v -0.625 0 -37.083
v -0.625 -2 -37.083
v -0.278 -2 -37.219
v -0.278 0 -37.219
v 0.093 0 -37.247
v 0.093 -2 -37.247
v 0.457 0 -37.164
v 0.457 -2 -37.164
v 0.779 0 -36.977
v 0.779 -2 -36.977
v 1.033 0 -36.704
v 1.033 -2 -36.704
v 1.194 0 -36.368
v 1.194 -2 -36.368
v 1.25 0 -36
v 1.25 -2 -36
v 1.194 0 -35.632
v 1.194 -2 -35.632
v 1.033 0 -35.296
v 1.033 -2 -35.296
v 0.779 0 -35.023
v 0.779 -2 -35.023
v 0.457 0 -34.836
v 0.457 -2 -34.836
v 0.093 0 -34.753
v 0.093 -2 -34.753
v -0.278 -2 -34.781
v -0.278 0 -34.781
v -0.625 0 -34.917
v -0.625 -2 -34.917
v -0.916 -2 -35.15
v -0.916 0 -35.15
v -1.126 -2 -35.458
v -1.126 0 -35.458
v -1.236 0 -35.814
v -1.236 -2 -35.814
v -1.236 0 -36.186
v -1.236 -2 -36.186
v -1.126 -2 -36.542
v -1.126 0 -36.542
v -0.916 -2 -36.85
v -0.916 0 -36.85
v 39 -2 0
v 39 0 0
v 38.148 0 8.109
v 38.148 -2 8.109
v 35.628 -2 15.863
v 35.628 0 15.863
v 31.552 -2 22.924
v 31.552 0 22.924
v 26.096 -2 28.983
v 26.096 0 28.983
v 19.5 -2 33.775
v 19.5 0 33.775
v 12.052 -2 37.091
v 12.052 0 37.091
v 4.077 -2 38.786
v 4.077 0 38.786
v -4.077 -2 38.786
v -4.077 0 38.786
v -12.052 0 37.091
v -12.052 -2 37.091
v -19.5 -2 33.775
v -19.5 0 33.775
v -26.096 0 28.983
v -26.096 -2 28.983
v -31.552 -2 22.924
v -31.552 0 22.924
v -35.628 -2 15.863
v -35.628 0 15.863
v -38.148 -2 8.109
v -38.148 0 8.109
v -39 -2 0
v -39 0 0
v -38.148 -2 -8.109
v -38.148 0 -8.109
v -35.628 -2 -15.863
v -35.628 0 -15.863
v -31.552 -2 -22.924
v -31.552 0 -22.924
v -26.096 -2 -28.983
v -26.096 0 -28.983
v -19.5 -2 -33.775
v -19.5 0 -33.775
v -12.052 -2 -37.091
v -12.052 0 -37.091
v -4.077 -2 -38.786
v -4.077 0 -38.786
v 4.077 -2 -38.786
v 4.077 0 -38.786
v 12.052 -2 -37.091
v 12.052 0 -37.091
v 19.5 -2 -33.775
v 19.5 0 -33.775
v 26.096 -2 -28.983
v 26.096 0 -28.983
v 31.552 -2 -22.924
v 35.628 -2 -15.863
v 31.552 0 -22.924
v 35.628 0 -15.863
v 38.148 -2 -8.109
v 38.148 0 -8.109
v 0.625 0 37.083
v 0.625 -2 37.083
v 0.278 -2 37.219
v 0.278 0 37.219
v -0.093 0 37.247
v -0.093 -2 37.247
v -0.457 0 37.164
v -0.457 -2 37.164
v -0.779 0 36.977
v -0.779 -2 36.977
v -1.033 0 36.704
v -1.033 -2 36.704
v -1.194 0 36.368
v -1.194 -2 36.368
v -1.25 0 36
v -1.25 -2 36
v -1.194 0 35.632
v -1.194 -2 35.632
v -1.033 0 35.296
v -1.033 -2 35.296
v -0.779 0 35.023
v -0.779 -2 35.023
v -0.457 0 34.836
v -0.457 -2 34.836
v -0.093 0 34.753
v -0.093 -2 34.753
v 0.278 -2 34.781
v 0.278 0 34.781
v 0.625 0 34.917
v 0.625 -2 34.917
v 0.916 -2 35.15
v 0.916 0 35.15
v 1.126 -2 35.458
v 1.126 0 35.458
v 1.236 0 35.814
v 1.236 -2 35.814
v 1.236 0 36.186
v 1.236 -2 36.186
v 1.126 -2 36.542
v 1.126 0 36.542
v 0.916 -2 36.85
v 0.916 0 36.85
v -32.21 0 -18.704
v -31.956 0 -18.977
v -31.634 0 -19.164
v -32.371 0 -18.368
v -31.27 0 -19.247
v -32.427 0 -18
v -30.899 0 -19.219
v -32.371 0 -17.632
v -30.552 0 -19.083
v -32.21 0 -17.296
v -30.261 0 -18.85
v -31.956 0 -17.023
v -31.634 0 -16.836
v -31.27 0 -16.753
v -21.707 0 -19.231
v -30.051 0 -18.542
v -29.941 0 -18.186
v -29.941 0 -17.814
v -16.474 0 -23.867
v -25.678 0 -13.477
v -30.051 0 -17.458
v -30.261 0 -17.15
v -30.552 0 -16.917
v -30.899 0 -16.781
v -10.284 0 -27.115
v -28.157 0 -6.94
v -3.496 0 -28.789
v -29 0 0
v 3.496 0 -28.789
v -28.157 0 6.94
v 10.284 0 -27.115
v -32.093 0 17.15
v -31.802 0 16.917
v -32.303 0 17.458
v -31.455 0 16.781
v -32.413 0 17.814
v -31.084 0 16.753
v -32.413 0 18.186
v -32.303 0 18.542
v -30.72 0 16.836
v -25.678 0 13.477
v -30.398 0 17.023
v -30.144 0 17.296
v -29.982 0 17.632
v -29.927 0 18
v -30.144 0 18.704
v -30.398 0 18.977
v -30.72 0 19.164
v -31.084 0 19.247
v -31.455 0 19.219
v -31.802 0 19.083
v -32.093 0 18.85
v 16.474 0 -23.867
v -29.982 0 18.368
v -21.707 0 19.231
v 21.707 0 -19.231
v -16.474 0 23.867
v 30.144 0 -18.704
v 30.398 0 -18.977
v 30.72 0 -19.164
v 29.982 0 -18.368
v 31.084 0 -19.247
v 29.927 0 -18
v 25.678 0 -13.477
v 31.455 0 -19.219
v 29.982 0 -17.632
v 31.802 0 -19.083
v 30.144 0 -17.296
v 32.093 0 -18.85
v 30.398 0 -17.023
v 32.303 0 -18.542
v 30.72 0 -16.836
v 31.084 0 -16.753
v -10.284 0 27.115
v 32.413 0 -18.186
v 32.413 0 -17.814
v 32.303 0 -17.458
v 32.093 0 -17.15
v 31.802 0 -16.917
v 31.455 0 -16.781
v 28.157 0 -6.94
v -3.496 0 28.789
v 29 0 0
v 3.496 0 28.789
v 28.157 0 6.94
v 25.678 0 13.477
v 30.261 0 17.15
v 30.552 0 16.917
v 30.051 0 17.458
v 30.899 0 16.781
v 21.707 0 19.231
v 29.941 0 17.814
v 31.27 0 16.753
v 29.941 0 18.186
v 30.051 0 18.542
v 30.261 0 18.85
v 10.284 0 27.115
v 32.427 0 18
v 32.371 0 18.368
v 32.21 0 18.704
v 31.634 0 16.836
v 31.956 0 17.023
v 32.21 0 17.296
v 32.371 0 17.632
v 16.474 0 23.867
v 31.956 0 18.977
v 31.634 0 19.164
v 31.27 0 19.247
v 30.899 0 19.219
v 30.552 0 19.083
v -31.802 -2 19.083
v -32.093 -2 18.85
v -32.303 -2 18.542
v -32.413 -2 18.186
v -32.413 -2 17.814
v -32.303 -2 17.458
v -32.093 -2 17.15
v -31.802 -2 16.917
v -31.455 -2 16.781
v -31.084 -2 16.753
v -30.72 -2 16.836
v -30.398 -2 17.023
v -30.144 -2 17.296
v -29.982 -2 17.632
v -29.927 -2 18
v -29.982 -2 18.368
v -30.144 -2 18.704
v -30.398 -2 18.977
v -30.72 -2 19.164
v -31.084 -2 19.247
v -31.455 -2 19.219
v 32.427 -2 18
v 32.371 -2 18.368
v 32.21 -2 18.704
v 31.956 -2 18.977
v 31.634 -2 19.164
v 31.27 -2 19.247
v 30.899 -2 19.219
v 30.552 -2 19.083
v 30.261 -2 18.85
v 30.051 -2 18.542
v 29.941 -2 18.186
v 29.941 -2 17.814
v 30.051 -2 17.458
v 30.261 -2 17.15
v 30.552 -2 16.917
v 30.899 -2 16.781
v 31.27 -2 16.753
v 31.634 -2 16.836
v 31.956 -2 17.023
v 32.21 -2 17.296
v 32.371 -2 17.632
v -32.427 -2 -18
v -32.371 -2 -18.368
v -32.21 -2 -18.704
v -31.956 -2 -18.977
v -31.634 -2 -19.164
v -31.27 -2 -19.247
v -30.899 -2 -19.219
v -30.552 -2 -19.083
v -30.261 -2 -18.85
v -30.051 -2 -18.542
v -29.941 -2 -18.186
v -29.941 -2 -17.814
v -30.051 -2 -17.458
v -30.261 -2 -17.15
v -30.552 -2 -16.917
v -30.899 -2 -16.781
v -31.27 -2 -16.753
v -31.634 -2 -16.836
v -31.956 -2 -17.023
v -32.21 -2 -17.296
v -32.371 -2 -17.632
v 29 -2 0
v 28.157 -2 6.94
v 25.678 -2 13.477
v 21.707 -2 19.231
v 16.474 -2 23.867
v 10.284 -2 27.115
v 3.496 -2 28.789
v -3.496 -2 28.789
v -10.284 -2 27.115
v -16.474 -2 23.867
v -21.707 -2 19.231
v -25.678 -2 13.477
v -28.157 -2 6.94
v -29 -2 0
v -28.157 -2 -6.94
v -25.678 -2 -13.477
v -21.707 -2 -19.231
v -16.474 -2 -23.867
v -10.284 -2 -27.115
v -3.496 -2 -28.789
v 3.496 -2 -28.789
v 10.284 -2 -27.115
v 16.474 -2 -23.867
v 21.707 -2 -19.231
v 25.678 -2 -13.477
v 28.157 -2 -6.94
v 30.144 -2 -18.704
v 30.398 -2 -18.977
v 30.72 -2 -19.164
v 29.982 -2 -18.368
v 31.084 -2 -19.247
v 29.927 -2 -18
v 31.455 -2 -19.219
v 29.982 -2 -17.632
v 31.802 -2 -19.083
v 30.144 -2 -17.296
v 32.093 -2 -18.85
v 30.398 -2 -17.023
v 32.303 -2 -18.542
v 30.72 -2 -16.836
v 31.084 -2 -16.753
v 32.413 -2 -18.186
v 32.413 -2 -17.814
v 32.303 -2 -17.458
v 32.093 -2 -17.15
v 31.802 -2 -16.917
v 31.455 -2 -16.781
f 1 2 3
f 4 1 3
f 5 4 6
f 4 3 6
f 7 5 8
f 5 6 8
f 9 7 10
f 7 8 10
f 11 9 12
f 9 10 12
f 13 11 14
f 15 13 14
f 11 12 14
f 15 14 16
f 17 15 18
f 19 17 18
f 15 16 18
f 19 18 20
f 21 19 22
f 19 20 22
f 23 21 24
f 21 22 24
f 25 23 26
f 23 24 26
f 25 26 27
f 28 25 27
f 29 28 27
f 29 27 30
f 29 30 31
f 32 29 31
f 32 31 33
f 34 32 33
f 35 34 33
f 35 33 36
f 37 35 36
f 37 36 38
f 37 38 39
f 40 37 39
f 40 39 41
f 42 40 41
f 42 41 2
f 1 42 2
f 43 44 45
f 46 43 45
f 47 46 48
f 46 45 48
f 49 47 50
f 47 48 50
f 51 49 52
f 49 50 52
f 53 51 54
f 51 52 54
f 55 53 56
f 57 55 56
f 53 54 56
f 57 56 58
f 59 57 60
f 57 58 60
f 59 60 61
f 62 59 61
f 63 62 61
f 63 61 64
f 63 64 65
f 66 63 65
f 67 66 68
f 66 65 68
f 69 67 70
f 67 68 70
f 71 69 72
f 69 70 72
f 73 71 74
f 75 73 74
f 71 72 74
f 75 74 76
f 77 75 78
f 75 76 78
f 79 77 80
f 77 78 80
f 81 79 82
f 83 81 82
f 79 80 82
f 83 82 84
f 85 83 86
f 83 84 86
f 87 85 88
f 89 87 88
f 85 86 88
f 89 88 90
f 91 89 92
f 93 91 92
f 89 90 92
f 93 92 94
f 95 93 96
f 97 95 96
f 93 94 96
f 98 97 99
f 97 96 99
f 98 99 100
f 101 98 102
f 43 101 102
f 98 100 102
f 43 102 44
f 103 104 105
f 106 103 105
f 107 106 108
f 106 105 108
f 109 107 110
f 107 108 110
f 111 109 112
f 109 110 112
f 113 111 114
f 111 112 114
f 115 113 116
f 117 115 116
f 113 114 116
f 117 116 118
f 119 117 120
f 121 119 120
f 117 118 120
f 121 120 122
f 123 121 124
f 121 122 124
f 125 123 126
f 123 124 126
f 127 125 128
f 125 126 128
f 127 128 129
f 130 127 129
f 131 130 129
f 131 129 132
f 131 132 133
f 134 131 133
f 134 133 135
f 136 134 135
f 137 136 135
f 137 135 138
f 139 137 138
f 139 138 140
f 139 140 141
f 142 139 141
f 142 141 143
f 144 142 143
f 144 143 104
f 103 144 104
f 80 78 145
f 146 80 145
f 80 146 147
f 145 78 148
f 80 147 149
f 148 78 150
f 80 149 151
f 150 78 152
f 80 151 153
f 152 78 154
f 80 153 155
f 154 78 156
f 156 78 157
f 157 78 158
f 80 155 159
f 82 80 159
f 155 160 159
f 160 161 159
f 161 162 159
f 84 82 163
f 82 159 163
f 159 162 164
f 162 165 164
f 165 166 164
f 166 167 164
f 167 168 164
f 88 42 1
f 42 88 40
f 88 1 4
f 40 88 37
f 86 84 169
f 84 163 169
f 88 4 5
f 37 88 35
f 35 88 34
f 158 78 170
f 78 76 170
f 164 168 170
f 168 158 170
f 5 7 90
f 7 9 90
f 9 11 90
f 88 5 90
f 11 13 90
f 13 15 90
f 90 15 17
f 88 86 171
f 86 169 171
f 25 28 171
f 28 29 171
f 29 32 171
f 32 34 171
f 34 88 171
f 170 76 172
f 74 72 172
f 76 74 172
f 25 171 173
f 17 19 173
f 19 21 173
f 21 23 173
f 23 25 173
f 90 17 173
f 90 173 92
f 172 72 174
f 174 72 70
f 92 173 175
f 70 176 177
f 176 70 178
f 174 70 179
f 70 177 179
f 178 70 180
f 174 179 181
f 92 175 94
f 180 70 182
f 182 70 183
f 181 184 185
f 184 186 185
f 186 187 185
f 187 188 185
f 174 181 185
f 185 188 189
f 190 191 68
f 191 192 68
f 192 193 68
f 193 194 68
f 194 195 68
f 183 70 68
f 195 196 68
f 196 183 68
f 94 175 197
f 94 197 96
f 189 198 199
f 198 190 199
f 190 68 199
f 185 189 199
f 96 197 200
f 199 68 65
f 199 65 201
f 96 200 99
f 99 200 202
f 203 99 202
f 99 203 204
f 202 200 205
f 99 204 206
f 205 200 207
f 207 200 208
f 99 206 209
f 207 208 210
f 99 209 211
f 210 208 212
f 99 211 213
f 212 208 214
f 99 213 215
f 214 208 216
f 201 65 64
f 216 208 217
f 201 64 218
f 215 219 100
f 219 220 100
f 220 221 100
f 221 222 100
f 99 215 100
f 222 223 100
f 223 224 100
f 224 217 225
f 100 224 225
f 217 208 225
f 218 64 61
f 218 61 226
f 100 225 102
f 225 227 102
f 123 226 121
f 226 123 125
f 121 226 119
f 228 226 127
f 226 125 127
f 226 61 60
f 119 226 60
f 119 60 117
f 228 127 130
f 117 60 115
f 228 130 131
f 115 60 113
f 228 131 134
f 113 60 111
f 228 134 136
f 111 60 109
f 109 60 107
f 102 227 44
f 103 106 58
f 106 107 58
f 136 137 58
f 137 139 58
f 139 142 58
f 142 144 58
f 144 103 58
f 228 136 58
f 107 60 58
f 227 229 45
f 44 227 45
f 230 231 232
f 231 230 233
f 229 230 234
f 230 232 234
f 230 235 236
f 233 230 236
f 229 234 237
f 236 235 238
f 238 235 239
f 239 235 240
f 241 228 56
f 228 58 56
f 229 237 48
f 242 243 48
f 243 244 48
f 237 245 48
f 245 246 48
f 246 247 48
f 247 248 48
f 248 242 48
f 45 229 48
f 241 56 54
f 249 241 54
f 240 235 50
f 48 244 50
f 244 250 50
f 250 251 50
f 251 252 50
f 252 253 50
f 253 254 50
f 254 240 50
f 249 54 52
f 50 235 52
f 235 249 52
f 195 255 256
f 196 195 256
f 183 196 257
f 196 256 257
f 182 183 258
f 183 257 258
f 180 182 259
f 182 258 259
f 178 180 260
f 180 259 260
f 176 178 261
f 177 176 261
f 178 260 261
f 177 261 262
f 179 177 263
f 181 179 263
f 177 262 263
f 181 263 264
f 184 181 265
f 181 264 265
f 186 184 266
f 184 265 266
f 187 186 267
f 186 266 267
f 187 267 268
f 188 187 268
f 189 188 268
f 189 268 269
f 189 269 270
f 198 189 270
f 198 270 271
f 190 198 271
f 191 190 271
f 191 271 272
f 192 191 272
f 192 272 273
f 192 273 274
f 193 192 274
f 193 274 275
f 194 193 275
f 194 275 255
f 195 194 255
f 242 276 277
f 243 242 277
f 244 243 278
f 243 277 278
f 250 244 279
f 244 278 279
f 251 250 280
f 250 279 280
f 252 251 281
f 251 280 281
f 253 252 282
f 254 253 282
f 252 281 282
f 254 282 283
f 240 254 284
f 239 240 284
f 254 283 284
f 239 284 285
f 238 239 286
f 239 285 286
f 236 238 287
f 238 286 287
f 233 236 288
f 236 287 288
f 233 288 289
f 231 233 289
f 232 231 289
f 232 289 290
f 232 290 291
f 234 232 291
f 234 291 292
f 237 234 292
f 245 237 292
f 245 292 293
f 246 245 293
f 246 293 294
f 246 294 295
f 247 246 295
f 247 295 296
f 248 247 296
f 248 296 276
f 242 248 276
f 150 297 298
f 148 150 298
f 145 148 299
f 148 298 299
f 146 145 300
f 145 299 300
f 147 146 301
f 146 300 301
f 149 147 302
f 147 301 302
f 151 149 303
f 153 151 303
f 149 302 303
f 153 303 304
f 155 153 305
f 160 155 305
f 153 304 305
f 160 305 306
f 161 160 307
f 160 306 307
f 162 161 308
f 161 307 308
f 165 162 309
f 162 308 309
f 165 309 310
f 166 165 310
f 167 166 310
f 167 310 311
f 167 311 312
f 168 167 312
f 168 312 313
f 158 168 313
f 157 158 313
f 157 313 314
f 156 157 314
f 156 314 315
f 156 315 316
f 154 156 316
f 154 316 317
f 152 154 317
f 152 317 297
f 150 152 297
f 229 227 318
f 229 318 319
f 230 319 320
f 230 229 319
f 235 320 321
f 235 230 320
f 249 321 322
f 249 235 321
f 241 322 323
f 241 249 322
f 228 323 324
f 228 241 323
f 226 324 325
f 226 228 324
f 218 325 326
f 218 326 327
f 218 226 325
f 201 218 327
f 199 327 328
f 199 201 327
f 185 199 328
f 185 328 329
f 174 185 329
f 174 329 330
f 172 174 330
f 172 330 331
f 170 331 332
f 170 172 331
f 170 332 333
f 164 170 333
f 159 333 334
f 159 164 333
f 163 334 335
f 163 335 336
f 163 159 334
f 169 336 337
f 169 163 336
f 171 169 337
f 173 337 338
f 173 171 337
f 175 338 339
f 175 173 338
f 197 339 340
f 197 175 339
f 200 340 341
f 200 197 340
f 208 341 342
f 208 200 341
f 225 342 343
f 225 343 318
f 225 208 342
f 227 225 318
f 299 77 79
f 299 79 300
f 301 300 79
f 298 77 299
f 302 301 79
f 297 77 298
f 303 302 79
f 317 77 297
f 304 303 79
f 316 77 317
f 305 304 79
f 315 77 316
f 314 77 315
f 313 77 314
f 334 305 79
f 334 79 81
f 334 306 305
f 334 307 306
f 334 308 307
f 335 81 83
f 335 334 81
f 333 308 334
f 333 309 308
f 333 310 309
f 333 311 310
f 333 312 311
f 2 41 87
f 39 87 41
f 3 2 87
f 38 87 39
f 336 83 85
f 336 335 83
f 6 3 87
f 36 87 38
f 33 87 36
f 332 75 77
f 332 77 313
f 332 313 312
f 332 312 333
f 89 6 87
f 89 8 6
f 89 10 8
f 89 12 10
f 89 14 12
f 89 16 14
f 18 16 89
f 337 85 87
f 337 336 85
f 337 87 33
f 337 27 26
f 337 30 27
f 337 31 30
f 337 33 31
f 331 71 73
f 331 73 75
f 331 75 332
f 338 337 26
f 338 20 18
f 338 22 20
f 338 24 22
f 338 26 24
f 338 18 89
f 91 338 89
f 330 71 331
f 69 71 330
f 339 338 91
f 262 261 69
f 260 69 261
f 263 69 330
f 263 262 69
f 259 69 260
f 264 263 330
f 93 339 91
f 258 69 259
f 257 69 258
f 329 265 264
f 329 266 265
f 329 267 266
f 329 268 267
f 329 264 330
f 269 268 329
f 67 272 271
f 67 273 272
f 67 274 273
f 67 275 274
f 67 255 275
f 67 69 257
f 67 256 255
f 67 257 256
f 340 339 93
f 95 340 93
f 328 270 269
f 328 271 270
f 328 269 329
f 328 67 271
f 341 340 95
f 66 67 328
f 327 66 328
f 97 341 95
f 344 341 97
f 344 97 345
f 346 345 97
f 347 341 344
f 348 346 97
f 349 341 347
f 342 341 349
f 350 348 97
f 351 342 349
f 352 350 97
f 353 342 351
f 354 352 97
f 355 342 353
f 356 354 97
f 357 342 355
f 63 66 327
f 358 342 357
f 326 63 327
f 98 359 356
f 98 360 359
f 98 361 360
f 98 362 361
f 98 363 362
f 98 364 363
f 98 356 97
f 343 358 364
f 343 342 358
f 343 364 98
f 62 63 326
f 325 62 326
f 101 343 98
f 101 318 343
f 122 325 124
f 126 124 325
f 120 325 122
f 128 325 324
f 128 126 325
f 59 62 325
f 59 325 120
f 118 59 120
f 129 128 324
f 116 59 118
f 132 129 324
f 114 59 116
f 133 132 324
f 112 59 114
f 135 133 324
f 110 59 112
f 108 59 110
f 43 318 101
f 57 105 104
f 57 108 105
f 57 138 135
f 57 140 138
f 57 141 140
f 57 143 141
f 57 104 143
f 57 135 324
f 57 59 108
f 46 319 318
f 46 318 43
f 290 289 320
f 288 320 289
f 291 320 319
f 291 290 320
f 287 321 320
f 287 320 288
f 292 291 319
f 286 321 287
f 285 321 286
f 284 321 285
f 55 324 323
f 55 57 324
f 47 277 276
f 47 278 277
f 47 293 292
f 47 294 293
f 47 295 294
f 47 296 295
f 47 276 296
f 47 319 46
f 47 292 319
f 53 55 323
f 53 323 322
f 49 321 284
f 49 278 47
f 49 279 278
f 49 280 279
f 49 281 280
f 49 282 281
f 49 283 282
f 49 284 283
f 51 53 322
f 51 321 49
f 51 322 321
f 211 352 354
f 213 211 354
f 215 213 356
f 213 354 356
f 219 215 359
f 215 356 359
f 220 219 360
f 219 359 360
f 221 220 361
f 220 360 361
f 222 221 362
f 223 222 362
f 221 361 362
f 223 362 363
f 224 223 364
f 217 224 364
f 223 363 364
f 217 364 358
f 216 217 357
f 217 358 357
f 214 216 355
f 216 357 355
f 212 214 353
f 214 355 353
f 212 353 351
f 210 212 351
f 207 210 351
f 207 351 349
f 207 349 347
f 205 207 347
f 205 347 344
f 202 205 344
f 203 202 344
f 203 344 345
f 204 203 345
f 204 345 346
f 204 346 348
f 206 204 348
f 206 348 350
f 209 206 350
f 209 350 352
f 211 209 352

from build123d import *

# Parameters (mm, degrees)
F0_R            = 39
F0_R_2          = 29
F1_DEPTH        = 2
F2_R            = 1.25
F3_DEPTH        = 2.001
F3_COPIES_COUNT = 6


# Not quite as in the source:
# - a pattern or mirror of a feature is missing from the dataset's text; its kind, count and spacing are read off the source's solid


with BuildPart() as f1:
    # F0 (on Front) → F1 (new body)
    with BuildSketch(Plane.XZ):
        Circle(F0_R)
        Circle(F0_R_2, mode=Mode.SUBTRACT)
    extrude(amount=F1_DEPTH)

    # F2 (on face) → F3 (cut, through all)
    with BuildSketch(Plane.XZ.offset(2)):
        with Locations((31.1769145362, 18)):
            Circle(F2_R)
    f3 = extrude(amount=-F3_DEPTH, mode=Mode.SUBTRACT)

    # F3_copies: F3 ×6 about axis
    f3_copies_axis = Axis((0, 0, 0), (0, 1, 0))
    for i in range(1, F3_COPIES_COUNT):
        add(f3.rotate(f3_copies_axis, i * 360 / F3_COPIES_COUNT), mode=Mode.SUBTRACT)


solid = f1.part
